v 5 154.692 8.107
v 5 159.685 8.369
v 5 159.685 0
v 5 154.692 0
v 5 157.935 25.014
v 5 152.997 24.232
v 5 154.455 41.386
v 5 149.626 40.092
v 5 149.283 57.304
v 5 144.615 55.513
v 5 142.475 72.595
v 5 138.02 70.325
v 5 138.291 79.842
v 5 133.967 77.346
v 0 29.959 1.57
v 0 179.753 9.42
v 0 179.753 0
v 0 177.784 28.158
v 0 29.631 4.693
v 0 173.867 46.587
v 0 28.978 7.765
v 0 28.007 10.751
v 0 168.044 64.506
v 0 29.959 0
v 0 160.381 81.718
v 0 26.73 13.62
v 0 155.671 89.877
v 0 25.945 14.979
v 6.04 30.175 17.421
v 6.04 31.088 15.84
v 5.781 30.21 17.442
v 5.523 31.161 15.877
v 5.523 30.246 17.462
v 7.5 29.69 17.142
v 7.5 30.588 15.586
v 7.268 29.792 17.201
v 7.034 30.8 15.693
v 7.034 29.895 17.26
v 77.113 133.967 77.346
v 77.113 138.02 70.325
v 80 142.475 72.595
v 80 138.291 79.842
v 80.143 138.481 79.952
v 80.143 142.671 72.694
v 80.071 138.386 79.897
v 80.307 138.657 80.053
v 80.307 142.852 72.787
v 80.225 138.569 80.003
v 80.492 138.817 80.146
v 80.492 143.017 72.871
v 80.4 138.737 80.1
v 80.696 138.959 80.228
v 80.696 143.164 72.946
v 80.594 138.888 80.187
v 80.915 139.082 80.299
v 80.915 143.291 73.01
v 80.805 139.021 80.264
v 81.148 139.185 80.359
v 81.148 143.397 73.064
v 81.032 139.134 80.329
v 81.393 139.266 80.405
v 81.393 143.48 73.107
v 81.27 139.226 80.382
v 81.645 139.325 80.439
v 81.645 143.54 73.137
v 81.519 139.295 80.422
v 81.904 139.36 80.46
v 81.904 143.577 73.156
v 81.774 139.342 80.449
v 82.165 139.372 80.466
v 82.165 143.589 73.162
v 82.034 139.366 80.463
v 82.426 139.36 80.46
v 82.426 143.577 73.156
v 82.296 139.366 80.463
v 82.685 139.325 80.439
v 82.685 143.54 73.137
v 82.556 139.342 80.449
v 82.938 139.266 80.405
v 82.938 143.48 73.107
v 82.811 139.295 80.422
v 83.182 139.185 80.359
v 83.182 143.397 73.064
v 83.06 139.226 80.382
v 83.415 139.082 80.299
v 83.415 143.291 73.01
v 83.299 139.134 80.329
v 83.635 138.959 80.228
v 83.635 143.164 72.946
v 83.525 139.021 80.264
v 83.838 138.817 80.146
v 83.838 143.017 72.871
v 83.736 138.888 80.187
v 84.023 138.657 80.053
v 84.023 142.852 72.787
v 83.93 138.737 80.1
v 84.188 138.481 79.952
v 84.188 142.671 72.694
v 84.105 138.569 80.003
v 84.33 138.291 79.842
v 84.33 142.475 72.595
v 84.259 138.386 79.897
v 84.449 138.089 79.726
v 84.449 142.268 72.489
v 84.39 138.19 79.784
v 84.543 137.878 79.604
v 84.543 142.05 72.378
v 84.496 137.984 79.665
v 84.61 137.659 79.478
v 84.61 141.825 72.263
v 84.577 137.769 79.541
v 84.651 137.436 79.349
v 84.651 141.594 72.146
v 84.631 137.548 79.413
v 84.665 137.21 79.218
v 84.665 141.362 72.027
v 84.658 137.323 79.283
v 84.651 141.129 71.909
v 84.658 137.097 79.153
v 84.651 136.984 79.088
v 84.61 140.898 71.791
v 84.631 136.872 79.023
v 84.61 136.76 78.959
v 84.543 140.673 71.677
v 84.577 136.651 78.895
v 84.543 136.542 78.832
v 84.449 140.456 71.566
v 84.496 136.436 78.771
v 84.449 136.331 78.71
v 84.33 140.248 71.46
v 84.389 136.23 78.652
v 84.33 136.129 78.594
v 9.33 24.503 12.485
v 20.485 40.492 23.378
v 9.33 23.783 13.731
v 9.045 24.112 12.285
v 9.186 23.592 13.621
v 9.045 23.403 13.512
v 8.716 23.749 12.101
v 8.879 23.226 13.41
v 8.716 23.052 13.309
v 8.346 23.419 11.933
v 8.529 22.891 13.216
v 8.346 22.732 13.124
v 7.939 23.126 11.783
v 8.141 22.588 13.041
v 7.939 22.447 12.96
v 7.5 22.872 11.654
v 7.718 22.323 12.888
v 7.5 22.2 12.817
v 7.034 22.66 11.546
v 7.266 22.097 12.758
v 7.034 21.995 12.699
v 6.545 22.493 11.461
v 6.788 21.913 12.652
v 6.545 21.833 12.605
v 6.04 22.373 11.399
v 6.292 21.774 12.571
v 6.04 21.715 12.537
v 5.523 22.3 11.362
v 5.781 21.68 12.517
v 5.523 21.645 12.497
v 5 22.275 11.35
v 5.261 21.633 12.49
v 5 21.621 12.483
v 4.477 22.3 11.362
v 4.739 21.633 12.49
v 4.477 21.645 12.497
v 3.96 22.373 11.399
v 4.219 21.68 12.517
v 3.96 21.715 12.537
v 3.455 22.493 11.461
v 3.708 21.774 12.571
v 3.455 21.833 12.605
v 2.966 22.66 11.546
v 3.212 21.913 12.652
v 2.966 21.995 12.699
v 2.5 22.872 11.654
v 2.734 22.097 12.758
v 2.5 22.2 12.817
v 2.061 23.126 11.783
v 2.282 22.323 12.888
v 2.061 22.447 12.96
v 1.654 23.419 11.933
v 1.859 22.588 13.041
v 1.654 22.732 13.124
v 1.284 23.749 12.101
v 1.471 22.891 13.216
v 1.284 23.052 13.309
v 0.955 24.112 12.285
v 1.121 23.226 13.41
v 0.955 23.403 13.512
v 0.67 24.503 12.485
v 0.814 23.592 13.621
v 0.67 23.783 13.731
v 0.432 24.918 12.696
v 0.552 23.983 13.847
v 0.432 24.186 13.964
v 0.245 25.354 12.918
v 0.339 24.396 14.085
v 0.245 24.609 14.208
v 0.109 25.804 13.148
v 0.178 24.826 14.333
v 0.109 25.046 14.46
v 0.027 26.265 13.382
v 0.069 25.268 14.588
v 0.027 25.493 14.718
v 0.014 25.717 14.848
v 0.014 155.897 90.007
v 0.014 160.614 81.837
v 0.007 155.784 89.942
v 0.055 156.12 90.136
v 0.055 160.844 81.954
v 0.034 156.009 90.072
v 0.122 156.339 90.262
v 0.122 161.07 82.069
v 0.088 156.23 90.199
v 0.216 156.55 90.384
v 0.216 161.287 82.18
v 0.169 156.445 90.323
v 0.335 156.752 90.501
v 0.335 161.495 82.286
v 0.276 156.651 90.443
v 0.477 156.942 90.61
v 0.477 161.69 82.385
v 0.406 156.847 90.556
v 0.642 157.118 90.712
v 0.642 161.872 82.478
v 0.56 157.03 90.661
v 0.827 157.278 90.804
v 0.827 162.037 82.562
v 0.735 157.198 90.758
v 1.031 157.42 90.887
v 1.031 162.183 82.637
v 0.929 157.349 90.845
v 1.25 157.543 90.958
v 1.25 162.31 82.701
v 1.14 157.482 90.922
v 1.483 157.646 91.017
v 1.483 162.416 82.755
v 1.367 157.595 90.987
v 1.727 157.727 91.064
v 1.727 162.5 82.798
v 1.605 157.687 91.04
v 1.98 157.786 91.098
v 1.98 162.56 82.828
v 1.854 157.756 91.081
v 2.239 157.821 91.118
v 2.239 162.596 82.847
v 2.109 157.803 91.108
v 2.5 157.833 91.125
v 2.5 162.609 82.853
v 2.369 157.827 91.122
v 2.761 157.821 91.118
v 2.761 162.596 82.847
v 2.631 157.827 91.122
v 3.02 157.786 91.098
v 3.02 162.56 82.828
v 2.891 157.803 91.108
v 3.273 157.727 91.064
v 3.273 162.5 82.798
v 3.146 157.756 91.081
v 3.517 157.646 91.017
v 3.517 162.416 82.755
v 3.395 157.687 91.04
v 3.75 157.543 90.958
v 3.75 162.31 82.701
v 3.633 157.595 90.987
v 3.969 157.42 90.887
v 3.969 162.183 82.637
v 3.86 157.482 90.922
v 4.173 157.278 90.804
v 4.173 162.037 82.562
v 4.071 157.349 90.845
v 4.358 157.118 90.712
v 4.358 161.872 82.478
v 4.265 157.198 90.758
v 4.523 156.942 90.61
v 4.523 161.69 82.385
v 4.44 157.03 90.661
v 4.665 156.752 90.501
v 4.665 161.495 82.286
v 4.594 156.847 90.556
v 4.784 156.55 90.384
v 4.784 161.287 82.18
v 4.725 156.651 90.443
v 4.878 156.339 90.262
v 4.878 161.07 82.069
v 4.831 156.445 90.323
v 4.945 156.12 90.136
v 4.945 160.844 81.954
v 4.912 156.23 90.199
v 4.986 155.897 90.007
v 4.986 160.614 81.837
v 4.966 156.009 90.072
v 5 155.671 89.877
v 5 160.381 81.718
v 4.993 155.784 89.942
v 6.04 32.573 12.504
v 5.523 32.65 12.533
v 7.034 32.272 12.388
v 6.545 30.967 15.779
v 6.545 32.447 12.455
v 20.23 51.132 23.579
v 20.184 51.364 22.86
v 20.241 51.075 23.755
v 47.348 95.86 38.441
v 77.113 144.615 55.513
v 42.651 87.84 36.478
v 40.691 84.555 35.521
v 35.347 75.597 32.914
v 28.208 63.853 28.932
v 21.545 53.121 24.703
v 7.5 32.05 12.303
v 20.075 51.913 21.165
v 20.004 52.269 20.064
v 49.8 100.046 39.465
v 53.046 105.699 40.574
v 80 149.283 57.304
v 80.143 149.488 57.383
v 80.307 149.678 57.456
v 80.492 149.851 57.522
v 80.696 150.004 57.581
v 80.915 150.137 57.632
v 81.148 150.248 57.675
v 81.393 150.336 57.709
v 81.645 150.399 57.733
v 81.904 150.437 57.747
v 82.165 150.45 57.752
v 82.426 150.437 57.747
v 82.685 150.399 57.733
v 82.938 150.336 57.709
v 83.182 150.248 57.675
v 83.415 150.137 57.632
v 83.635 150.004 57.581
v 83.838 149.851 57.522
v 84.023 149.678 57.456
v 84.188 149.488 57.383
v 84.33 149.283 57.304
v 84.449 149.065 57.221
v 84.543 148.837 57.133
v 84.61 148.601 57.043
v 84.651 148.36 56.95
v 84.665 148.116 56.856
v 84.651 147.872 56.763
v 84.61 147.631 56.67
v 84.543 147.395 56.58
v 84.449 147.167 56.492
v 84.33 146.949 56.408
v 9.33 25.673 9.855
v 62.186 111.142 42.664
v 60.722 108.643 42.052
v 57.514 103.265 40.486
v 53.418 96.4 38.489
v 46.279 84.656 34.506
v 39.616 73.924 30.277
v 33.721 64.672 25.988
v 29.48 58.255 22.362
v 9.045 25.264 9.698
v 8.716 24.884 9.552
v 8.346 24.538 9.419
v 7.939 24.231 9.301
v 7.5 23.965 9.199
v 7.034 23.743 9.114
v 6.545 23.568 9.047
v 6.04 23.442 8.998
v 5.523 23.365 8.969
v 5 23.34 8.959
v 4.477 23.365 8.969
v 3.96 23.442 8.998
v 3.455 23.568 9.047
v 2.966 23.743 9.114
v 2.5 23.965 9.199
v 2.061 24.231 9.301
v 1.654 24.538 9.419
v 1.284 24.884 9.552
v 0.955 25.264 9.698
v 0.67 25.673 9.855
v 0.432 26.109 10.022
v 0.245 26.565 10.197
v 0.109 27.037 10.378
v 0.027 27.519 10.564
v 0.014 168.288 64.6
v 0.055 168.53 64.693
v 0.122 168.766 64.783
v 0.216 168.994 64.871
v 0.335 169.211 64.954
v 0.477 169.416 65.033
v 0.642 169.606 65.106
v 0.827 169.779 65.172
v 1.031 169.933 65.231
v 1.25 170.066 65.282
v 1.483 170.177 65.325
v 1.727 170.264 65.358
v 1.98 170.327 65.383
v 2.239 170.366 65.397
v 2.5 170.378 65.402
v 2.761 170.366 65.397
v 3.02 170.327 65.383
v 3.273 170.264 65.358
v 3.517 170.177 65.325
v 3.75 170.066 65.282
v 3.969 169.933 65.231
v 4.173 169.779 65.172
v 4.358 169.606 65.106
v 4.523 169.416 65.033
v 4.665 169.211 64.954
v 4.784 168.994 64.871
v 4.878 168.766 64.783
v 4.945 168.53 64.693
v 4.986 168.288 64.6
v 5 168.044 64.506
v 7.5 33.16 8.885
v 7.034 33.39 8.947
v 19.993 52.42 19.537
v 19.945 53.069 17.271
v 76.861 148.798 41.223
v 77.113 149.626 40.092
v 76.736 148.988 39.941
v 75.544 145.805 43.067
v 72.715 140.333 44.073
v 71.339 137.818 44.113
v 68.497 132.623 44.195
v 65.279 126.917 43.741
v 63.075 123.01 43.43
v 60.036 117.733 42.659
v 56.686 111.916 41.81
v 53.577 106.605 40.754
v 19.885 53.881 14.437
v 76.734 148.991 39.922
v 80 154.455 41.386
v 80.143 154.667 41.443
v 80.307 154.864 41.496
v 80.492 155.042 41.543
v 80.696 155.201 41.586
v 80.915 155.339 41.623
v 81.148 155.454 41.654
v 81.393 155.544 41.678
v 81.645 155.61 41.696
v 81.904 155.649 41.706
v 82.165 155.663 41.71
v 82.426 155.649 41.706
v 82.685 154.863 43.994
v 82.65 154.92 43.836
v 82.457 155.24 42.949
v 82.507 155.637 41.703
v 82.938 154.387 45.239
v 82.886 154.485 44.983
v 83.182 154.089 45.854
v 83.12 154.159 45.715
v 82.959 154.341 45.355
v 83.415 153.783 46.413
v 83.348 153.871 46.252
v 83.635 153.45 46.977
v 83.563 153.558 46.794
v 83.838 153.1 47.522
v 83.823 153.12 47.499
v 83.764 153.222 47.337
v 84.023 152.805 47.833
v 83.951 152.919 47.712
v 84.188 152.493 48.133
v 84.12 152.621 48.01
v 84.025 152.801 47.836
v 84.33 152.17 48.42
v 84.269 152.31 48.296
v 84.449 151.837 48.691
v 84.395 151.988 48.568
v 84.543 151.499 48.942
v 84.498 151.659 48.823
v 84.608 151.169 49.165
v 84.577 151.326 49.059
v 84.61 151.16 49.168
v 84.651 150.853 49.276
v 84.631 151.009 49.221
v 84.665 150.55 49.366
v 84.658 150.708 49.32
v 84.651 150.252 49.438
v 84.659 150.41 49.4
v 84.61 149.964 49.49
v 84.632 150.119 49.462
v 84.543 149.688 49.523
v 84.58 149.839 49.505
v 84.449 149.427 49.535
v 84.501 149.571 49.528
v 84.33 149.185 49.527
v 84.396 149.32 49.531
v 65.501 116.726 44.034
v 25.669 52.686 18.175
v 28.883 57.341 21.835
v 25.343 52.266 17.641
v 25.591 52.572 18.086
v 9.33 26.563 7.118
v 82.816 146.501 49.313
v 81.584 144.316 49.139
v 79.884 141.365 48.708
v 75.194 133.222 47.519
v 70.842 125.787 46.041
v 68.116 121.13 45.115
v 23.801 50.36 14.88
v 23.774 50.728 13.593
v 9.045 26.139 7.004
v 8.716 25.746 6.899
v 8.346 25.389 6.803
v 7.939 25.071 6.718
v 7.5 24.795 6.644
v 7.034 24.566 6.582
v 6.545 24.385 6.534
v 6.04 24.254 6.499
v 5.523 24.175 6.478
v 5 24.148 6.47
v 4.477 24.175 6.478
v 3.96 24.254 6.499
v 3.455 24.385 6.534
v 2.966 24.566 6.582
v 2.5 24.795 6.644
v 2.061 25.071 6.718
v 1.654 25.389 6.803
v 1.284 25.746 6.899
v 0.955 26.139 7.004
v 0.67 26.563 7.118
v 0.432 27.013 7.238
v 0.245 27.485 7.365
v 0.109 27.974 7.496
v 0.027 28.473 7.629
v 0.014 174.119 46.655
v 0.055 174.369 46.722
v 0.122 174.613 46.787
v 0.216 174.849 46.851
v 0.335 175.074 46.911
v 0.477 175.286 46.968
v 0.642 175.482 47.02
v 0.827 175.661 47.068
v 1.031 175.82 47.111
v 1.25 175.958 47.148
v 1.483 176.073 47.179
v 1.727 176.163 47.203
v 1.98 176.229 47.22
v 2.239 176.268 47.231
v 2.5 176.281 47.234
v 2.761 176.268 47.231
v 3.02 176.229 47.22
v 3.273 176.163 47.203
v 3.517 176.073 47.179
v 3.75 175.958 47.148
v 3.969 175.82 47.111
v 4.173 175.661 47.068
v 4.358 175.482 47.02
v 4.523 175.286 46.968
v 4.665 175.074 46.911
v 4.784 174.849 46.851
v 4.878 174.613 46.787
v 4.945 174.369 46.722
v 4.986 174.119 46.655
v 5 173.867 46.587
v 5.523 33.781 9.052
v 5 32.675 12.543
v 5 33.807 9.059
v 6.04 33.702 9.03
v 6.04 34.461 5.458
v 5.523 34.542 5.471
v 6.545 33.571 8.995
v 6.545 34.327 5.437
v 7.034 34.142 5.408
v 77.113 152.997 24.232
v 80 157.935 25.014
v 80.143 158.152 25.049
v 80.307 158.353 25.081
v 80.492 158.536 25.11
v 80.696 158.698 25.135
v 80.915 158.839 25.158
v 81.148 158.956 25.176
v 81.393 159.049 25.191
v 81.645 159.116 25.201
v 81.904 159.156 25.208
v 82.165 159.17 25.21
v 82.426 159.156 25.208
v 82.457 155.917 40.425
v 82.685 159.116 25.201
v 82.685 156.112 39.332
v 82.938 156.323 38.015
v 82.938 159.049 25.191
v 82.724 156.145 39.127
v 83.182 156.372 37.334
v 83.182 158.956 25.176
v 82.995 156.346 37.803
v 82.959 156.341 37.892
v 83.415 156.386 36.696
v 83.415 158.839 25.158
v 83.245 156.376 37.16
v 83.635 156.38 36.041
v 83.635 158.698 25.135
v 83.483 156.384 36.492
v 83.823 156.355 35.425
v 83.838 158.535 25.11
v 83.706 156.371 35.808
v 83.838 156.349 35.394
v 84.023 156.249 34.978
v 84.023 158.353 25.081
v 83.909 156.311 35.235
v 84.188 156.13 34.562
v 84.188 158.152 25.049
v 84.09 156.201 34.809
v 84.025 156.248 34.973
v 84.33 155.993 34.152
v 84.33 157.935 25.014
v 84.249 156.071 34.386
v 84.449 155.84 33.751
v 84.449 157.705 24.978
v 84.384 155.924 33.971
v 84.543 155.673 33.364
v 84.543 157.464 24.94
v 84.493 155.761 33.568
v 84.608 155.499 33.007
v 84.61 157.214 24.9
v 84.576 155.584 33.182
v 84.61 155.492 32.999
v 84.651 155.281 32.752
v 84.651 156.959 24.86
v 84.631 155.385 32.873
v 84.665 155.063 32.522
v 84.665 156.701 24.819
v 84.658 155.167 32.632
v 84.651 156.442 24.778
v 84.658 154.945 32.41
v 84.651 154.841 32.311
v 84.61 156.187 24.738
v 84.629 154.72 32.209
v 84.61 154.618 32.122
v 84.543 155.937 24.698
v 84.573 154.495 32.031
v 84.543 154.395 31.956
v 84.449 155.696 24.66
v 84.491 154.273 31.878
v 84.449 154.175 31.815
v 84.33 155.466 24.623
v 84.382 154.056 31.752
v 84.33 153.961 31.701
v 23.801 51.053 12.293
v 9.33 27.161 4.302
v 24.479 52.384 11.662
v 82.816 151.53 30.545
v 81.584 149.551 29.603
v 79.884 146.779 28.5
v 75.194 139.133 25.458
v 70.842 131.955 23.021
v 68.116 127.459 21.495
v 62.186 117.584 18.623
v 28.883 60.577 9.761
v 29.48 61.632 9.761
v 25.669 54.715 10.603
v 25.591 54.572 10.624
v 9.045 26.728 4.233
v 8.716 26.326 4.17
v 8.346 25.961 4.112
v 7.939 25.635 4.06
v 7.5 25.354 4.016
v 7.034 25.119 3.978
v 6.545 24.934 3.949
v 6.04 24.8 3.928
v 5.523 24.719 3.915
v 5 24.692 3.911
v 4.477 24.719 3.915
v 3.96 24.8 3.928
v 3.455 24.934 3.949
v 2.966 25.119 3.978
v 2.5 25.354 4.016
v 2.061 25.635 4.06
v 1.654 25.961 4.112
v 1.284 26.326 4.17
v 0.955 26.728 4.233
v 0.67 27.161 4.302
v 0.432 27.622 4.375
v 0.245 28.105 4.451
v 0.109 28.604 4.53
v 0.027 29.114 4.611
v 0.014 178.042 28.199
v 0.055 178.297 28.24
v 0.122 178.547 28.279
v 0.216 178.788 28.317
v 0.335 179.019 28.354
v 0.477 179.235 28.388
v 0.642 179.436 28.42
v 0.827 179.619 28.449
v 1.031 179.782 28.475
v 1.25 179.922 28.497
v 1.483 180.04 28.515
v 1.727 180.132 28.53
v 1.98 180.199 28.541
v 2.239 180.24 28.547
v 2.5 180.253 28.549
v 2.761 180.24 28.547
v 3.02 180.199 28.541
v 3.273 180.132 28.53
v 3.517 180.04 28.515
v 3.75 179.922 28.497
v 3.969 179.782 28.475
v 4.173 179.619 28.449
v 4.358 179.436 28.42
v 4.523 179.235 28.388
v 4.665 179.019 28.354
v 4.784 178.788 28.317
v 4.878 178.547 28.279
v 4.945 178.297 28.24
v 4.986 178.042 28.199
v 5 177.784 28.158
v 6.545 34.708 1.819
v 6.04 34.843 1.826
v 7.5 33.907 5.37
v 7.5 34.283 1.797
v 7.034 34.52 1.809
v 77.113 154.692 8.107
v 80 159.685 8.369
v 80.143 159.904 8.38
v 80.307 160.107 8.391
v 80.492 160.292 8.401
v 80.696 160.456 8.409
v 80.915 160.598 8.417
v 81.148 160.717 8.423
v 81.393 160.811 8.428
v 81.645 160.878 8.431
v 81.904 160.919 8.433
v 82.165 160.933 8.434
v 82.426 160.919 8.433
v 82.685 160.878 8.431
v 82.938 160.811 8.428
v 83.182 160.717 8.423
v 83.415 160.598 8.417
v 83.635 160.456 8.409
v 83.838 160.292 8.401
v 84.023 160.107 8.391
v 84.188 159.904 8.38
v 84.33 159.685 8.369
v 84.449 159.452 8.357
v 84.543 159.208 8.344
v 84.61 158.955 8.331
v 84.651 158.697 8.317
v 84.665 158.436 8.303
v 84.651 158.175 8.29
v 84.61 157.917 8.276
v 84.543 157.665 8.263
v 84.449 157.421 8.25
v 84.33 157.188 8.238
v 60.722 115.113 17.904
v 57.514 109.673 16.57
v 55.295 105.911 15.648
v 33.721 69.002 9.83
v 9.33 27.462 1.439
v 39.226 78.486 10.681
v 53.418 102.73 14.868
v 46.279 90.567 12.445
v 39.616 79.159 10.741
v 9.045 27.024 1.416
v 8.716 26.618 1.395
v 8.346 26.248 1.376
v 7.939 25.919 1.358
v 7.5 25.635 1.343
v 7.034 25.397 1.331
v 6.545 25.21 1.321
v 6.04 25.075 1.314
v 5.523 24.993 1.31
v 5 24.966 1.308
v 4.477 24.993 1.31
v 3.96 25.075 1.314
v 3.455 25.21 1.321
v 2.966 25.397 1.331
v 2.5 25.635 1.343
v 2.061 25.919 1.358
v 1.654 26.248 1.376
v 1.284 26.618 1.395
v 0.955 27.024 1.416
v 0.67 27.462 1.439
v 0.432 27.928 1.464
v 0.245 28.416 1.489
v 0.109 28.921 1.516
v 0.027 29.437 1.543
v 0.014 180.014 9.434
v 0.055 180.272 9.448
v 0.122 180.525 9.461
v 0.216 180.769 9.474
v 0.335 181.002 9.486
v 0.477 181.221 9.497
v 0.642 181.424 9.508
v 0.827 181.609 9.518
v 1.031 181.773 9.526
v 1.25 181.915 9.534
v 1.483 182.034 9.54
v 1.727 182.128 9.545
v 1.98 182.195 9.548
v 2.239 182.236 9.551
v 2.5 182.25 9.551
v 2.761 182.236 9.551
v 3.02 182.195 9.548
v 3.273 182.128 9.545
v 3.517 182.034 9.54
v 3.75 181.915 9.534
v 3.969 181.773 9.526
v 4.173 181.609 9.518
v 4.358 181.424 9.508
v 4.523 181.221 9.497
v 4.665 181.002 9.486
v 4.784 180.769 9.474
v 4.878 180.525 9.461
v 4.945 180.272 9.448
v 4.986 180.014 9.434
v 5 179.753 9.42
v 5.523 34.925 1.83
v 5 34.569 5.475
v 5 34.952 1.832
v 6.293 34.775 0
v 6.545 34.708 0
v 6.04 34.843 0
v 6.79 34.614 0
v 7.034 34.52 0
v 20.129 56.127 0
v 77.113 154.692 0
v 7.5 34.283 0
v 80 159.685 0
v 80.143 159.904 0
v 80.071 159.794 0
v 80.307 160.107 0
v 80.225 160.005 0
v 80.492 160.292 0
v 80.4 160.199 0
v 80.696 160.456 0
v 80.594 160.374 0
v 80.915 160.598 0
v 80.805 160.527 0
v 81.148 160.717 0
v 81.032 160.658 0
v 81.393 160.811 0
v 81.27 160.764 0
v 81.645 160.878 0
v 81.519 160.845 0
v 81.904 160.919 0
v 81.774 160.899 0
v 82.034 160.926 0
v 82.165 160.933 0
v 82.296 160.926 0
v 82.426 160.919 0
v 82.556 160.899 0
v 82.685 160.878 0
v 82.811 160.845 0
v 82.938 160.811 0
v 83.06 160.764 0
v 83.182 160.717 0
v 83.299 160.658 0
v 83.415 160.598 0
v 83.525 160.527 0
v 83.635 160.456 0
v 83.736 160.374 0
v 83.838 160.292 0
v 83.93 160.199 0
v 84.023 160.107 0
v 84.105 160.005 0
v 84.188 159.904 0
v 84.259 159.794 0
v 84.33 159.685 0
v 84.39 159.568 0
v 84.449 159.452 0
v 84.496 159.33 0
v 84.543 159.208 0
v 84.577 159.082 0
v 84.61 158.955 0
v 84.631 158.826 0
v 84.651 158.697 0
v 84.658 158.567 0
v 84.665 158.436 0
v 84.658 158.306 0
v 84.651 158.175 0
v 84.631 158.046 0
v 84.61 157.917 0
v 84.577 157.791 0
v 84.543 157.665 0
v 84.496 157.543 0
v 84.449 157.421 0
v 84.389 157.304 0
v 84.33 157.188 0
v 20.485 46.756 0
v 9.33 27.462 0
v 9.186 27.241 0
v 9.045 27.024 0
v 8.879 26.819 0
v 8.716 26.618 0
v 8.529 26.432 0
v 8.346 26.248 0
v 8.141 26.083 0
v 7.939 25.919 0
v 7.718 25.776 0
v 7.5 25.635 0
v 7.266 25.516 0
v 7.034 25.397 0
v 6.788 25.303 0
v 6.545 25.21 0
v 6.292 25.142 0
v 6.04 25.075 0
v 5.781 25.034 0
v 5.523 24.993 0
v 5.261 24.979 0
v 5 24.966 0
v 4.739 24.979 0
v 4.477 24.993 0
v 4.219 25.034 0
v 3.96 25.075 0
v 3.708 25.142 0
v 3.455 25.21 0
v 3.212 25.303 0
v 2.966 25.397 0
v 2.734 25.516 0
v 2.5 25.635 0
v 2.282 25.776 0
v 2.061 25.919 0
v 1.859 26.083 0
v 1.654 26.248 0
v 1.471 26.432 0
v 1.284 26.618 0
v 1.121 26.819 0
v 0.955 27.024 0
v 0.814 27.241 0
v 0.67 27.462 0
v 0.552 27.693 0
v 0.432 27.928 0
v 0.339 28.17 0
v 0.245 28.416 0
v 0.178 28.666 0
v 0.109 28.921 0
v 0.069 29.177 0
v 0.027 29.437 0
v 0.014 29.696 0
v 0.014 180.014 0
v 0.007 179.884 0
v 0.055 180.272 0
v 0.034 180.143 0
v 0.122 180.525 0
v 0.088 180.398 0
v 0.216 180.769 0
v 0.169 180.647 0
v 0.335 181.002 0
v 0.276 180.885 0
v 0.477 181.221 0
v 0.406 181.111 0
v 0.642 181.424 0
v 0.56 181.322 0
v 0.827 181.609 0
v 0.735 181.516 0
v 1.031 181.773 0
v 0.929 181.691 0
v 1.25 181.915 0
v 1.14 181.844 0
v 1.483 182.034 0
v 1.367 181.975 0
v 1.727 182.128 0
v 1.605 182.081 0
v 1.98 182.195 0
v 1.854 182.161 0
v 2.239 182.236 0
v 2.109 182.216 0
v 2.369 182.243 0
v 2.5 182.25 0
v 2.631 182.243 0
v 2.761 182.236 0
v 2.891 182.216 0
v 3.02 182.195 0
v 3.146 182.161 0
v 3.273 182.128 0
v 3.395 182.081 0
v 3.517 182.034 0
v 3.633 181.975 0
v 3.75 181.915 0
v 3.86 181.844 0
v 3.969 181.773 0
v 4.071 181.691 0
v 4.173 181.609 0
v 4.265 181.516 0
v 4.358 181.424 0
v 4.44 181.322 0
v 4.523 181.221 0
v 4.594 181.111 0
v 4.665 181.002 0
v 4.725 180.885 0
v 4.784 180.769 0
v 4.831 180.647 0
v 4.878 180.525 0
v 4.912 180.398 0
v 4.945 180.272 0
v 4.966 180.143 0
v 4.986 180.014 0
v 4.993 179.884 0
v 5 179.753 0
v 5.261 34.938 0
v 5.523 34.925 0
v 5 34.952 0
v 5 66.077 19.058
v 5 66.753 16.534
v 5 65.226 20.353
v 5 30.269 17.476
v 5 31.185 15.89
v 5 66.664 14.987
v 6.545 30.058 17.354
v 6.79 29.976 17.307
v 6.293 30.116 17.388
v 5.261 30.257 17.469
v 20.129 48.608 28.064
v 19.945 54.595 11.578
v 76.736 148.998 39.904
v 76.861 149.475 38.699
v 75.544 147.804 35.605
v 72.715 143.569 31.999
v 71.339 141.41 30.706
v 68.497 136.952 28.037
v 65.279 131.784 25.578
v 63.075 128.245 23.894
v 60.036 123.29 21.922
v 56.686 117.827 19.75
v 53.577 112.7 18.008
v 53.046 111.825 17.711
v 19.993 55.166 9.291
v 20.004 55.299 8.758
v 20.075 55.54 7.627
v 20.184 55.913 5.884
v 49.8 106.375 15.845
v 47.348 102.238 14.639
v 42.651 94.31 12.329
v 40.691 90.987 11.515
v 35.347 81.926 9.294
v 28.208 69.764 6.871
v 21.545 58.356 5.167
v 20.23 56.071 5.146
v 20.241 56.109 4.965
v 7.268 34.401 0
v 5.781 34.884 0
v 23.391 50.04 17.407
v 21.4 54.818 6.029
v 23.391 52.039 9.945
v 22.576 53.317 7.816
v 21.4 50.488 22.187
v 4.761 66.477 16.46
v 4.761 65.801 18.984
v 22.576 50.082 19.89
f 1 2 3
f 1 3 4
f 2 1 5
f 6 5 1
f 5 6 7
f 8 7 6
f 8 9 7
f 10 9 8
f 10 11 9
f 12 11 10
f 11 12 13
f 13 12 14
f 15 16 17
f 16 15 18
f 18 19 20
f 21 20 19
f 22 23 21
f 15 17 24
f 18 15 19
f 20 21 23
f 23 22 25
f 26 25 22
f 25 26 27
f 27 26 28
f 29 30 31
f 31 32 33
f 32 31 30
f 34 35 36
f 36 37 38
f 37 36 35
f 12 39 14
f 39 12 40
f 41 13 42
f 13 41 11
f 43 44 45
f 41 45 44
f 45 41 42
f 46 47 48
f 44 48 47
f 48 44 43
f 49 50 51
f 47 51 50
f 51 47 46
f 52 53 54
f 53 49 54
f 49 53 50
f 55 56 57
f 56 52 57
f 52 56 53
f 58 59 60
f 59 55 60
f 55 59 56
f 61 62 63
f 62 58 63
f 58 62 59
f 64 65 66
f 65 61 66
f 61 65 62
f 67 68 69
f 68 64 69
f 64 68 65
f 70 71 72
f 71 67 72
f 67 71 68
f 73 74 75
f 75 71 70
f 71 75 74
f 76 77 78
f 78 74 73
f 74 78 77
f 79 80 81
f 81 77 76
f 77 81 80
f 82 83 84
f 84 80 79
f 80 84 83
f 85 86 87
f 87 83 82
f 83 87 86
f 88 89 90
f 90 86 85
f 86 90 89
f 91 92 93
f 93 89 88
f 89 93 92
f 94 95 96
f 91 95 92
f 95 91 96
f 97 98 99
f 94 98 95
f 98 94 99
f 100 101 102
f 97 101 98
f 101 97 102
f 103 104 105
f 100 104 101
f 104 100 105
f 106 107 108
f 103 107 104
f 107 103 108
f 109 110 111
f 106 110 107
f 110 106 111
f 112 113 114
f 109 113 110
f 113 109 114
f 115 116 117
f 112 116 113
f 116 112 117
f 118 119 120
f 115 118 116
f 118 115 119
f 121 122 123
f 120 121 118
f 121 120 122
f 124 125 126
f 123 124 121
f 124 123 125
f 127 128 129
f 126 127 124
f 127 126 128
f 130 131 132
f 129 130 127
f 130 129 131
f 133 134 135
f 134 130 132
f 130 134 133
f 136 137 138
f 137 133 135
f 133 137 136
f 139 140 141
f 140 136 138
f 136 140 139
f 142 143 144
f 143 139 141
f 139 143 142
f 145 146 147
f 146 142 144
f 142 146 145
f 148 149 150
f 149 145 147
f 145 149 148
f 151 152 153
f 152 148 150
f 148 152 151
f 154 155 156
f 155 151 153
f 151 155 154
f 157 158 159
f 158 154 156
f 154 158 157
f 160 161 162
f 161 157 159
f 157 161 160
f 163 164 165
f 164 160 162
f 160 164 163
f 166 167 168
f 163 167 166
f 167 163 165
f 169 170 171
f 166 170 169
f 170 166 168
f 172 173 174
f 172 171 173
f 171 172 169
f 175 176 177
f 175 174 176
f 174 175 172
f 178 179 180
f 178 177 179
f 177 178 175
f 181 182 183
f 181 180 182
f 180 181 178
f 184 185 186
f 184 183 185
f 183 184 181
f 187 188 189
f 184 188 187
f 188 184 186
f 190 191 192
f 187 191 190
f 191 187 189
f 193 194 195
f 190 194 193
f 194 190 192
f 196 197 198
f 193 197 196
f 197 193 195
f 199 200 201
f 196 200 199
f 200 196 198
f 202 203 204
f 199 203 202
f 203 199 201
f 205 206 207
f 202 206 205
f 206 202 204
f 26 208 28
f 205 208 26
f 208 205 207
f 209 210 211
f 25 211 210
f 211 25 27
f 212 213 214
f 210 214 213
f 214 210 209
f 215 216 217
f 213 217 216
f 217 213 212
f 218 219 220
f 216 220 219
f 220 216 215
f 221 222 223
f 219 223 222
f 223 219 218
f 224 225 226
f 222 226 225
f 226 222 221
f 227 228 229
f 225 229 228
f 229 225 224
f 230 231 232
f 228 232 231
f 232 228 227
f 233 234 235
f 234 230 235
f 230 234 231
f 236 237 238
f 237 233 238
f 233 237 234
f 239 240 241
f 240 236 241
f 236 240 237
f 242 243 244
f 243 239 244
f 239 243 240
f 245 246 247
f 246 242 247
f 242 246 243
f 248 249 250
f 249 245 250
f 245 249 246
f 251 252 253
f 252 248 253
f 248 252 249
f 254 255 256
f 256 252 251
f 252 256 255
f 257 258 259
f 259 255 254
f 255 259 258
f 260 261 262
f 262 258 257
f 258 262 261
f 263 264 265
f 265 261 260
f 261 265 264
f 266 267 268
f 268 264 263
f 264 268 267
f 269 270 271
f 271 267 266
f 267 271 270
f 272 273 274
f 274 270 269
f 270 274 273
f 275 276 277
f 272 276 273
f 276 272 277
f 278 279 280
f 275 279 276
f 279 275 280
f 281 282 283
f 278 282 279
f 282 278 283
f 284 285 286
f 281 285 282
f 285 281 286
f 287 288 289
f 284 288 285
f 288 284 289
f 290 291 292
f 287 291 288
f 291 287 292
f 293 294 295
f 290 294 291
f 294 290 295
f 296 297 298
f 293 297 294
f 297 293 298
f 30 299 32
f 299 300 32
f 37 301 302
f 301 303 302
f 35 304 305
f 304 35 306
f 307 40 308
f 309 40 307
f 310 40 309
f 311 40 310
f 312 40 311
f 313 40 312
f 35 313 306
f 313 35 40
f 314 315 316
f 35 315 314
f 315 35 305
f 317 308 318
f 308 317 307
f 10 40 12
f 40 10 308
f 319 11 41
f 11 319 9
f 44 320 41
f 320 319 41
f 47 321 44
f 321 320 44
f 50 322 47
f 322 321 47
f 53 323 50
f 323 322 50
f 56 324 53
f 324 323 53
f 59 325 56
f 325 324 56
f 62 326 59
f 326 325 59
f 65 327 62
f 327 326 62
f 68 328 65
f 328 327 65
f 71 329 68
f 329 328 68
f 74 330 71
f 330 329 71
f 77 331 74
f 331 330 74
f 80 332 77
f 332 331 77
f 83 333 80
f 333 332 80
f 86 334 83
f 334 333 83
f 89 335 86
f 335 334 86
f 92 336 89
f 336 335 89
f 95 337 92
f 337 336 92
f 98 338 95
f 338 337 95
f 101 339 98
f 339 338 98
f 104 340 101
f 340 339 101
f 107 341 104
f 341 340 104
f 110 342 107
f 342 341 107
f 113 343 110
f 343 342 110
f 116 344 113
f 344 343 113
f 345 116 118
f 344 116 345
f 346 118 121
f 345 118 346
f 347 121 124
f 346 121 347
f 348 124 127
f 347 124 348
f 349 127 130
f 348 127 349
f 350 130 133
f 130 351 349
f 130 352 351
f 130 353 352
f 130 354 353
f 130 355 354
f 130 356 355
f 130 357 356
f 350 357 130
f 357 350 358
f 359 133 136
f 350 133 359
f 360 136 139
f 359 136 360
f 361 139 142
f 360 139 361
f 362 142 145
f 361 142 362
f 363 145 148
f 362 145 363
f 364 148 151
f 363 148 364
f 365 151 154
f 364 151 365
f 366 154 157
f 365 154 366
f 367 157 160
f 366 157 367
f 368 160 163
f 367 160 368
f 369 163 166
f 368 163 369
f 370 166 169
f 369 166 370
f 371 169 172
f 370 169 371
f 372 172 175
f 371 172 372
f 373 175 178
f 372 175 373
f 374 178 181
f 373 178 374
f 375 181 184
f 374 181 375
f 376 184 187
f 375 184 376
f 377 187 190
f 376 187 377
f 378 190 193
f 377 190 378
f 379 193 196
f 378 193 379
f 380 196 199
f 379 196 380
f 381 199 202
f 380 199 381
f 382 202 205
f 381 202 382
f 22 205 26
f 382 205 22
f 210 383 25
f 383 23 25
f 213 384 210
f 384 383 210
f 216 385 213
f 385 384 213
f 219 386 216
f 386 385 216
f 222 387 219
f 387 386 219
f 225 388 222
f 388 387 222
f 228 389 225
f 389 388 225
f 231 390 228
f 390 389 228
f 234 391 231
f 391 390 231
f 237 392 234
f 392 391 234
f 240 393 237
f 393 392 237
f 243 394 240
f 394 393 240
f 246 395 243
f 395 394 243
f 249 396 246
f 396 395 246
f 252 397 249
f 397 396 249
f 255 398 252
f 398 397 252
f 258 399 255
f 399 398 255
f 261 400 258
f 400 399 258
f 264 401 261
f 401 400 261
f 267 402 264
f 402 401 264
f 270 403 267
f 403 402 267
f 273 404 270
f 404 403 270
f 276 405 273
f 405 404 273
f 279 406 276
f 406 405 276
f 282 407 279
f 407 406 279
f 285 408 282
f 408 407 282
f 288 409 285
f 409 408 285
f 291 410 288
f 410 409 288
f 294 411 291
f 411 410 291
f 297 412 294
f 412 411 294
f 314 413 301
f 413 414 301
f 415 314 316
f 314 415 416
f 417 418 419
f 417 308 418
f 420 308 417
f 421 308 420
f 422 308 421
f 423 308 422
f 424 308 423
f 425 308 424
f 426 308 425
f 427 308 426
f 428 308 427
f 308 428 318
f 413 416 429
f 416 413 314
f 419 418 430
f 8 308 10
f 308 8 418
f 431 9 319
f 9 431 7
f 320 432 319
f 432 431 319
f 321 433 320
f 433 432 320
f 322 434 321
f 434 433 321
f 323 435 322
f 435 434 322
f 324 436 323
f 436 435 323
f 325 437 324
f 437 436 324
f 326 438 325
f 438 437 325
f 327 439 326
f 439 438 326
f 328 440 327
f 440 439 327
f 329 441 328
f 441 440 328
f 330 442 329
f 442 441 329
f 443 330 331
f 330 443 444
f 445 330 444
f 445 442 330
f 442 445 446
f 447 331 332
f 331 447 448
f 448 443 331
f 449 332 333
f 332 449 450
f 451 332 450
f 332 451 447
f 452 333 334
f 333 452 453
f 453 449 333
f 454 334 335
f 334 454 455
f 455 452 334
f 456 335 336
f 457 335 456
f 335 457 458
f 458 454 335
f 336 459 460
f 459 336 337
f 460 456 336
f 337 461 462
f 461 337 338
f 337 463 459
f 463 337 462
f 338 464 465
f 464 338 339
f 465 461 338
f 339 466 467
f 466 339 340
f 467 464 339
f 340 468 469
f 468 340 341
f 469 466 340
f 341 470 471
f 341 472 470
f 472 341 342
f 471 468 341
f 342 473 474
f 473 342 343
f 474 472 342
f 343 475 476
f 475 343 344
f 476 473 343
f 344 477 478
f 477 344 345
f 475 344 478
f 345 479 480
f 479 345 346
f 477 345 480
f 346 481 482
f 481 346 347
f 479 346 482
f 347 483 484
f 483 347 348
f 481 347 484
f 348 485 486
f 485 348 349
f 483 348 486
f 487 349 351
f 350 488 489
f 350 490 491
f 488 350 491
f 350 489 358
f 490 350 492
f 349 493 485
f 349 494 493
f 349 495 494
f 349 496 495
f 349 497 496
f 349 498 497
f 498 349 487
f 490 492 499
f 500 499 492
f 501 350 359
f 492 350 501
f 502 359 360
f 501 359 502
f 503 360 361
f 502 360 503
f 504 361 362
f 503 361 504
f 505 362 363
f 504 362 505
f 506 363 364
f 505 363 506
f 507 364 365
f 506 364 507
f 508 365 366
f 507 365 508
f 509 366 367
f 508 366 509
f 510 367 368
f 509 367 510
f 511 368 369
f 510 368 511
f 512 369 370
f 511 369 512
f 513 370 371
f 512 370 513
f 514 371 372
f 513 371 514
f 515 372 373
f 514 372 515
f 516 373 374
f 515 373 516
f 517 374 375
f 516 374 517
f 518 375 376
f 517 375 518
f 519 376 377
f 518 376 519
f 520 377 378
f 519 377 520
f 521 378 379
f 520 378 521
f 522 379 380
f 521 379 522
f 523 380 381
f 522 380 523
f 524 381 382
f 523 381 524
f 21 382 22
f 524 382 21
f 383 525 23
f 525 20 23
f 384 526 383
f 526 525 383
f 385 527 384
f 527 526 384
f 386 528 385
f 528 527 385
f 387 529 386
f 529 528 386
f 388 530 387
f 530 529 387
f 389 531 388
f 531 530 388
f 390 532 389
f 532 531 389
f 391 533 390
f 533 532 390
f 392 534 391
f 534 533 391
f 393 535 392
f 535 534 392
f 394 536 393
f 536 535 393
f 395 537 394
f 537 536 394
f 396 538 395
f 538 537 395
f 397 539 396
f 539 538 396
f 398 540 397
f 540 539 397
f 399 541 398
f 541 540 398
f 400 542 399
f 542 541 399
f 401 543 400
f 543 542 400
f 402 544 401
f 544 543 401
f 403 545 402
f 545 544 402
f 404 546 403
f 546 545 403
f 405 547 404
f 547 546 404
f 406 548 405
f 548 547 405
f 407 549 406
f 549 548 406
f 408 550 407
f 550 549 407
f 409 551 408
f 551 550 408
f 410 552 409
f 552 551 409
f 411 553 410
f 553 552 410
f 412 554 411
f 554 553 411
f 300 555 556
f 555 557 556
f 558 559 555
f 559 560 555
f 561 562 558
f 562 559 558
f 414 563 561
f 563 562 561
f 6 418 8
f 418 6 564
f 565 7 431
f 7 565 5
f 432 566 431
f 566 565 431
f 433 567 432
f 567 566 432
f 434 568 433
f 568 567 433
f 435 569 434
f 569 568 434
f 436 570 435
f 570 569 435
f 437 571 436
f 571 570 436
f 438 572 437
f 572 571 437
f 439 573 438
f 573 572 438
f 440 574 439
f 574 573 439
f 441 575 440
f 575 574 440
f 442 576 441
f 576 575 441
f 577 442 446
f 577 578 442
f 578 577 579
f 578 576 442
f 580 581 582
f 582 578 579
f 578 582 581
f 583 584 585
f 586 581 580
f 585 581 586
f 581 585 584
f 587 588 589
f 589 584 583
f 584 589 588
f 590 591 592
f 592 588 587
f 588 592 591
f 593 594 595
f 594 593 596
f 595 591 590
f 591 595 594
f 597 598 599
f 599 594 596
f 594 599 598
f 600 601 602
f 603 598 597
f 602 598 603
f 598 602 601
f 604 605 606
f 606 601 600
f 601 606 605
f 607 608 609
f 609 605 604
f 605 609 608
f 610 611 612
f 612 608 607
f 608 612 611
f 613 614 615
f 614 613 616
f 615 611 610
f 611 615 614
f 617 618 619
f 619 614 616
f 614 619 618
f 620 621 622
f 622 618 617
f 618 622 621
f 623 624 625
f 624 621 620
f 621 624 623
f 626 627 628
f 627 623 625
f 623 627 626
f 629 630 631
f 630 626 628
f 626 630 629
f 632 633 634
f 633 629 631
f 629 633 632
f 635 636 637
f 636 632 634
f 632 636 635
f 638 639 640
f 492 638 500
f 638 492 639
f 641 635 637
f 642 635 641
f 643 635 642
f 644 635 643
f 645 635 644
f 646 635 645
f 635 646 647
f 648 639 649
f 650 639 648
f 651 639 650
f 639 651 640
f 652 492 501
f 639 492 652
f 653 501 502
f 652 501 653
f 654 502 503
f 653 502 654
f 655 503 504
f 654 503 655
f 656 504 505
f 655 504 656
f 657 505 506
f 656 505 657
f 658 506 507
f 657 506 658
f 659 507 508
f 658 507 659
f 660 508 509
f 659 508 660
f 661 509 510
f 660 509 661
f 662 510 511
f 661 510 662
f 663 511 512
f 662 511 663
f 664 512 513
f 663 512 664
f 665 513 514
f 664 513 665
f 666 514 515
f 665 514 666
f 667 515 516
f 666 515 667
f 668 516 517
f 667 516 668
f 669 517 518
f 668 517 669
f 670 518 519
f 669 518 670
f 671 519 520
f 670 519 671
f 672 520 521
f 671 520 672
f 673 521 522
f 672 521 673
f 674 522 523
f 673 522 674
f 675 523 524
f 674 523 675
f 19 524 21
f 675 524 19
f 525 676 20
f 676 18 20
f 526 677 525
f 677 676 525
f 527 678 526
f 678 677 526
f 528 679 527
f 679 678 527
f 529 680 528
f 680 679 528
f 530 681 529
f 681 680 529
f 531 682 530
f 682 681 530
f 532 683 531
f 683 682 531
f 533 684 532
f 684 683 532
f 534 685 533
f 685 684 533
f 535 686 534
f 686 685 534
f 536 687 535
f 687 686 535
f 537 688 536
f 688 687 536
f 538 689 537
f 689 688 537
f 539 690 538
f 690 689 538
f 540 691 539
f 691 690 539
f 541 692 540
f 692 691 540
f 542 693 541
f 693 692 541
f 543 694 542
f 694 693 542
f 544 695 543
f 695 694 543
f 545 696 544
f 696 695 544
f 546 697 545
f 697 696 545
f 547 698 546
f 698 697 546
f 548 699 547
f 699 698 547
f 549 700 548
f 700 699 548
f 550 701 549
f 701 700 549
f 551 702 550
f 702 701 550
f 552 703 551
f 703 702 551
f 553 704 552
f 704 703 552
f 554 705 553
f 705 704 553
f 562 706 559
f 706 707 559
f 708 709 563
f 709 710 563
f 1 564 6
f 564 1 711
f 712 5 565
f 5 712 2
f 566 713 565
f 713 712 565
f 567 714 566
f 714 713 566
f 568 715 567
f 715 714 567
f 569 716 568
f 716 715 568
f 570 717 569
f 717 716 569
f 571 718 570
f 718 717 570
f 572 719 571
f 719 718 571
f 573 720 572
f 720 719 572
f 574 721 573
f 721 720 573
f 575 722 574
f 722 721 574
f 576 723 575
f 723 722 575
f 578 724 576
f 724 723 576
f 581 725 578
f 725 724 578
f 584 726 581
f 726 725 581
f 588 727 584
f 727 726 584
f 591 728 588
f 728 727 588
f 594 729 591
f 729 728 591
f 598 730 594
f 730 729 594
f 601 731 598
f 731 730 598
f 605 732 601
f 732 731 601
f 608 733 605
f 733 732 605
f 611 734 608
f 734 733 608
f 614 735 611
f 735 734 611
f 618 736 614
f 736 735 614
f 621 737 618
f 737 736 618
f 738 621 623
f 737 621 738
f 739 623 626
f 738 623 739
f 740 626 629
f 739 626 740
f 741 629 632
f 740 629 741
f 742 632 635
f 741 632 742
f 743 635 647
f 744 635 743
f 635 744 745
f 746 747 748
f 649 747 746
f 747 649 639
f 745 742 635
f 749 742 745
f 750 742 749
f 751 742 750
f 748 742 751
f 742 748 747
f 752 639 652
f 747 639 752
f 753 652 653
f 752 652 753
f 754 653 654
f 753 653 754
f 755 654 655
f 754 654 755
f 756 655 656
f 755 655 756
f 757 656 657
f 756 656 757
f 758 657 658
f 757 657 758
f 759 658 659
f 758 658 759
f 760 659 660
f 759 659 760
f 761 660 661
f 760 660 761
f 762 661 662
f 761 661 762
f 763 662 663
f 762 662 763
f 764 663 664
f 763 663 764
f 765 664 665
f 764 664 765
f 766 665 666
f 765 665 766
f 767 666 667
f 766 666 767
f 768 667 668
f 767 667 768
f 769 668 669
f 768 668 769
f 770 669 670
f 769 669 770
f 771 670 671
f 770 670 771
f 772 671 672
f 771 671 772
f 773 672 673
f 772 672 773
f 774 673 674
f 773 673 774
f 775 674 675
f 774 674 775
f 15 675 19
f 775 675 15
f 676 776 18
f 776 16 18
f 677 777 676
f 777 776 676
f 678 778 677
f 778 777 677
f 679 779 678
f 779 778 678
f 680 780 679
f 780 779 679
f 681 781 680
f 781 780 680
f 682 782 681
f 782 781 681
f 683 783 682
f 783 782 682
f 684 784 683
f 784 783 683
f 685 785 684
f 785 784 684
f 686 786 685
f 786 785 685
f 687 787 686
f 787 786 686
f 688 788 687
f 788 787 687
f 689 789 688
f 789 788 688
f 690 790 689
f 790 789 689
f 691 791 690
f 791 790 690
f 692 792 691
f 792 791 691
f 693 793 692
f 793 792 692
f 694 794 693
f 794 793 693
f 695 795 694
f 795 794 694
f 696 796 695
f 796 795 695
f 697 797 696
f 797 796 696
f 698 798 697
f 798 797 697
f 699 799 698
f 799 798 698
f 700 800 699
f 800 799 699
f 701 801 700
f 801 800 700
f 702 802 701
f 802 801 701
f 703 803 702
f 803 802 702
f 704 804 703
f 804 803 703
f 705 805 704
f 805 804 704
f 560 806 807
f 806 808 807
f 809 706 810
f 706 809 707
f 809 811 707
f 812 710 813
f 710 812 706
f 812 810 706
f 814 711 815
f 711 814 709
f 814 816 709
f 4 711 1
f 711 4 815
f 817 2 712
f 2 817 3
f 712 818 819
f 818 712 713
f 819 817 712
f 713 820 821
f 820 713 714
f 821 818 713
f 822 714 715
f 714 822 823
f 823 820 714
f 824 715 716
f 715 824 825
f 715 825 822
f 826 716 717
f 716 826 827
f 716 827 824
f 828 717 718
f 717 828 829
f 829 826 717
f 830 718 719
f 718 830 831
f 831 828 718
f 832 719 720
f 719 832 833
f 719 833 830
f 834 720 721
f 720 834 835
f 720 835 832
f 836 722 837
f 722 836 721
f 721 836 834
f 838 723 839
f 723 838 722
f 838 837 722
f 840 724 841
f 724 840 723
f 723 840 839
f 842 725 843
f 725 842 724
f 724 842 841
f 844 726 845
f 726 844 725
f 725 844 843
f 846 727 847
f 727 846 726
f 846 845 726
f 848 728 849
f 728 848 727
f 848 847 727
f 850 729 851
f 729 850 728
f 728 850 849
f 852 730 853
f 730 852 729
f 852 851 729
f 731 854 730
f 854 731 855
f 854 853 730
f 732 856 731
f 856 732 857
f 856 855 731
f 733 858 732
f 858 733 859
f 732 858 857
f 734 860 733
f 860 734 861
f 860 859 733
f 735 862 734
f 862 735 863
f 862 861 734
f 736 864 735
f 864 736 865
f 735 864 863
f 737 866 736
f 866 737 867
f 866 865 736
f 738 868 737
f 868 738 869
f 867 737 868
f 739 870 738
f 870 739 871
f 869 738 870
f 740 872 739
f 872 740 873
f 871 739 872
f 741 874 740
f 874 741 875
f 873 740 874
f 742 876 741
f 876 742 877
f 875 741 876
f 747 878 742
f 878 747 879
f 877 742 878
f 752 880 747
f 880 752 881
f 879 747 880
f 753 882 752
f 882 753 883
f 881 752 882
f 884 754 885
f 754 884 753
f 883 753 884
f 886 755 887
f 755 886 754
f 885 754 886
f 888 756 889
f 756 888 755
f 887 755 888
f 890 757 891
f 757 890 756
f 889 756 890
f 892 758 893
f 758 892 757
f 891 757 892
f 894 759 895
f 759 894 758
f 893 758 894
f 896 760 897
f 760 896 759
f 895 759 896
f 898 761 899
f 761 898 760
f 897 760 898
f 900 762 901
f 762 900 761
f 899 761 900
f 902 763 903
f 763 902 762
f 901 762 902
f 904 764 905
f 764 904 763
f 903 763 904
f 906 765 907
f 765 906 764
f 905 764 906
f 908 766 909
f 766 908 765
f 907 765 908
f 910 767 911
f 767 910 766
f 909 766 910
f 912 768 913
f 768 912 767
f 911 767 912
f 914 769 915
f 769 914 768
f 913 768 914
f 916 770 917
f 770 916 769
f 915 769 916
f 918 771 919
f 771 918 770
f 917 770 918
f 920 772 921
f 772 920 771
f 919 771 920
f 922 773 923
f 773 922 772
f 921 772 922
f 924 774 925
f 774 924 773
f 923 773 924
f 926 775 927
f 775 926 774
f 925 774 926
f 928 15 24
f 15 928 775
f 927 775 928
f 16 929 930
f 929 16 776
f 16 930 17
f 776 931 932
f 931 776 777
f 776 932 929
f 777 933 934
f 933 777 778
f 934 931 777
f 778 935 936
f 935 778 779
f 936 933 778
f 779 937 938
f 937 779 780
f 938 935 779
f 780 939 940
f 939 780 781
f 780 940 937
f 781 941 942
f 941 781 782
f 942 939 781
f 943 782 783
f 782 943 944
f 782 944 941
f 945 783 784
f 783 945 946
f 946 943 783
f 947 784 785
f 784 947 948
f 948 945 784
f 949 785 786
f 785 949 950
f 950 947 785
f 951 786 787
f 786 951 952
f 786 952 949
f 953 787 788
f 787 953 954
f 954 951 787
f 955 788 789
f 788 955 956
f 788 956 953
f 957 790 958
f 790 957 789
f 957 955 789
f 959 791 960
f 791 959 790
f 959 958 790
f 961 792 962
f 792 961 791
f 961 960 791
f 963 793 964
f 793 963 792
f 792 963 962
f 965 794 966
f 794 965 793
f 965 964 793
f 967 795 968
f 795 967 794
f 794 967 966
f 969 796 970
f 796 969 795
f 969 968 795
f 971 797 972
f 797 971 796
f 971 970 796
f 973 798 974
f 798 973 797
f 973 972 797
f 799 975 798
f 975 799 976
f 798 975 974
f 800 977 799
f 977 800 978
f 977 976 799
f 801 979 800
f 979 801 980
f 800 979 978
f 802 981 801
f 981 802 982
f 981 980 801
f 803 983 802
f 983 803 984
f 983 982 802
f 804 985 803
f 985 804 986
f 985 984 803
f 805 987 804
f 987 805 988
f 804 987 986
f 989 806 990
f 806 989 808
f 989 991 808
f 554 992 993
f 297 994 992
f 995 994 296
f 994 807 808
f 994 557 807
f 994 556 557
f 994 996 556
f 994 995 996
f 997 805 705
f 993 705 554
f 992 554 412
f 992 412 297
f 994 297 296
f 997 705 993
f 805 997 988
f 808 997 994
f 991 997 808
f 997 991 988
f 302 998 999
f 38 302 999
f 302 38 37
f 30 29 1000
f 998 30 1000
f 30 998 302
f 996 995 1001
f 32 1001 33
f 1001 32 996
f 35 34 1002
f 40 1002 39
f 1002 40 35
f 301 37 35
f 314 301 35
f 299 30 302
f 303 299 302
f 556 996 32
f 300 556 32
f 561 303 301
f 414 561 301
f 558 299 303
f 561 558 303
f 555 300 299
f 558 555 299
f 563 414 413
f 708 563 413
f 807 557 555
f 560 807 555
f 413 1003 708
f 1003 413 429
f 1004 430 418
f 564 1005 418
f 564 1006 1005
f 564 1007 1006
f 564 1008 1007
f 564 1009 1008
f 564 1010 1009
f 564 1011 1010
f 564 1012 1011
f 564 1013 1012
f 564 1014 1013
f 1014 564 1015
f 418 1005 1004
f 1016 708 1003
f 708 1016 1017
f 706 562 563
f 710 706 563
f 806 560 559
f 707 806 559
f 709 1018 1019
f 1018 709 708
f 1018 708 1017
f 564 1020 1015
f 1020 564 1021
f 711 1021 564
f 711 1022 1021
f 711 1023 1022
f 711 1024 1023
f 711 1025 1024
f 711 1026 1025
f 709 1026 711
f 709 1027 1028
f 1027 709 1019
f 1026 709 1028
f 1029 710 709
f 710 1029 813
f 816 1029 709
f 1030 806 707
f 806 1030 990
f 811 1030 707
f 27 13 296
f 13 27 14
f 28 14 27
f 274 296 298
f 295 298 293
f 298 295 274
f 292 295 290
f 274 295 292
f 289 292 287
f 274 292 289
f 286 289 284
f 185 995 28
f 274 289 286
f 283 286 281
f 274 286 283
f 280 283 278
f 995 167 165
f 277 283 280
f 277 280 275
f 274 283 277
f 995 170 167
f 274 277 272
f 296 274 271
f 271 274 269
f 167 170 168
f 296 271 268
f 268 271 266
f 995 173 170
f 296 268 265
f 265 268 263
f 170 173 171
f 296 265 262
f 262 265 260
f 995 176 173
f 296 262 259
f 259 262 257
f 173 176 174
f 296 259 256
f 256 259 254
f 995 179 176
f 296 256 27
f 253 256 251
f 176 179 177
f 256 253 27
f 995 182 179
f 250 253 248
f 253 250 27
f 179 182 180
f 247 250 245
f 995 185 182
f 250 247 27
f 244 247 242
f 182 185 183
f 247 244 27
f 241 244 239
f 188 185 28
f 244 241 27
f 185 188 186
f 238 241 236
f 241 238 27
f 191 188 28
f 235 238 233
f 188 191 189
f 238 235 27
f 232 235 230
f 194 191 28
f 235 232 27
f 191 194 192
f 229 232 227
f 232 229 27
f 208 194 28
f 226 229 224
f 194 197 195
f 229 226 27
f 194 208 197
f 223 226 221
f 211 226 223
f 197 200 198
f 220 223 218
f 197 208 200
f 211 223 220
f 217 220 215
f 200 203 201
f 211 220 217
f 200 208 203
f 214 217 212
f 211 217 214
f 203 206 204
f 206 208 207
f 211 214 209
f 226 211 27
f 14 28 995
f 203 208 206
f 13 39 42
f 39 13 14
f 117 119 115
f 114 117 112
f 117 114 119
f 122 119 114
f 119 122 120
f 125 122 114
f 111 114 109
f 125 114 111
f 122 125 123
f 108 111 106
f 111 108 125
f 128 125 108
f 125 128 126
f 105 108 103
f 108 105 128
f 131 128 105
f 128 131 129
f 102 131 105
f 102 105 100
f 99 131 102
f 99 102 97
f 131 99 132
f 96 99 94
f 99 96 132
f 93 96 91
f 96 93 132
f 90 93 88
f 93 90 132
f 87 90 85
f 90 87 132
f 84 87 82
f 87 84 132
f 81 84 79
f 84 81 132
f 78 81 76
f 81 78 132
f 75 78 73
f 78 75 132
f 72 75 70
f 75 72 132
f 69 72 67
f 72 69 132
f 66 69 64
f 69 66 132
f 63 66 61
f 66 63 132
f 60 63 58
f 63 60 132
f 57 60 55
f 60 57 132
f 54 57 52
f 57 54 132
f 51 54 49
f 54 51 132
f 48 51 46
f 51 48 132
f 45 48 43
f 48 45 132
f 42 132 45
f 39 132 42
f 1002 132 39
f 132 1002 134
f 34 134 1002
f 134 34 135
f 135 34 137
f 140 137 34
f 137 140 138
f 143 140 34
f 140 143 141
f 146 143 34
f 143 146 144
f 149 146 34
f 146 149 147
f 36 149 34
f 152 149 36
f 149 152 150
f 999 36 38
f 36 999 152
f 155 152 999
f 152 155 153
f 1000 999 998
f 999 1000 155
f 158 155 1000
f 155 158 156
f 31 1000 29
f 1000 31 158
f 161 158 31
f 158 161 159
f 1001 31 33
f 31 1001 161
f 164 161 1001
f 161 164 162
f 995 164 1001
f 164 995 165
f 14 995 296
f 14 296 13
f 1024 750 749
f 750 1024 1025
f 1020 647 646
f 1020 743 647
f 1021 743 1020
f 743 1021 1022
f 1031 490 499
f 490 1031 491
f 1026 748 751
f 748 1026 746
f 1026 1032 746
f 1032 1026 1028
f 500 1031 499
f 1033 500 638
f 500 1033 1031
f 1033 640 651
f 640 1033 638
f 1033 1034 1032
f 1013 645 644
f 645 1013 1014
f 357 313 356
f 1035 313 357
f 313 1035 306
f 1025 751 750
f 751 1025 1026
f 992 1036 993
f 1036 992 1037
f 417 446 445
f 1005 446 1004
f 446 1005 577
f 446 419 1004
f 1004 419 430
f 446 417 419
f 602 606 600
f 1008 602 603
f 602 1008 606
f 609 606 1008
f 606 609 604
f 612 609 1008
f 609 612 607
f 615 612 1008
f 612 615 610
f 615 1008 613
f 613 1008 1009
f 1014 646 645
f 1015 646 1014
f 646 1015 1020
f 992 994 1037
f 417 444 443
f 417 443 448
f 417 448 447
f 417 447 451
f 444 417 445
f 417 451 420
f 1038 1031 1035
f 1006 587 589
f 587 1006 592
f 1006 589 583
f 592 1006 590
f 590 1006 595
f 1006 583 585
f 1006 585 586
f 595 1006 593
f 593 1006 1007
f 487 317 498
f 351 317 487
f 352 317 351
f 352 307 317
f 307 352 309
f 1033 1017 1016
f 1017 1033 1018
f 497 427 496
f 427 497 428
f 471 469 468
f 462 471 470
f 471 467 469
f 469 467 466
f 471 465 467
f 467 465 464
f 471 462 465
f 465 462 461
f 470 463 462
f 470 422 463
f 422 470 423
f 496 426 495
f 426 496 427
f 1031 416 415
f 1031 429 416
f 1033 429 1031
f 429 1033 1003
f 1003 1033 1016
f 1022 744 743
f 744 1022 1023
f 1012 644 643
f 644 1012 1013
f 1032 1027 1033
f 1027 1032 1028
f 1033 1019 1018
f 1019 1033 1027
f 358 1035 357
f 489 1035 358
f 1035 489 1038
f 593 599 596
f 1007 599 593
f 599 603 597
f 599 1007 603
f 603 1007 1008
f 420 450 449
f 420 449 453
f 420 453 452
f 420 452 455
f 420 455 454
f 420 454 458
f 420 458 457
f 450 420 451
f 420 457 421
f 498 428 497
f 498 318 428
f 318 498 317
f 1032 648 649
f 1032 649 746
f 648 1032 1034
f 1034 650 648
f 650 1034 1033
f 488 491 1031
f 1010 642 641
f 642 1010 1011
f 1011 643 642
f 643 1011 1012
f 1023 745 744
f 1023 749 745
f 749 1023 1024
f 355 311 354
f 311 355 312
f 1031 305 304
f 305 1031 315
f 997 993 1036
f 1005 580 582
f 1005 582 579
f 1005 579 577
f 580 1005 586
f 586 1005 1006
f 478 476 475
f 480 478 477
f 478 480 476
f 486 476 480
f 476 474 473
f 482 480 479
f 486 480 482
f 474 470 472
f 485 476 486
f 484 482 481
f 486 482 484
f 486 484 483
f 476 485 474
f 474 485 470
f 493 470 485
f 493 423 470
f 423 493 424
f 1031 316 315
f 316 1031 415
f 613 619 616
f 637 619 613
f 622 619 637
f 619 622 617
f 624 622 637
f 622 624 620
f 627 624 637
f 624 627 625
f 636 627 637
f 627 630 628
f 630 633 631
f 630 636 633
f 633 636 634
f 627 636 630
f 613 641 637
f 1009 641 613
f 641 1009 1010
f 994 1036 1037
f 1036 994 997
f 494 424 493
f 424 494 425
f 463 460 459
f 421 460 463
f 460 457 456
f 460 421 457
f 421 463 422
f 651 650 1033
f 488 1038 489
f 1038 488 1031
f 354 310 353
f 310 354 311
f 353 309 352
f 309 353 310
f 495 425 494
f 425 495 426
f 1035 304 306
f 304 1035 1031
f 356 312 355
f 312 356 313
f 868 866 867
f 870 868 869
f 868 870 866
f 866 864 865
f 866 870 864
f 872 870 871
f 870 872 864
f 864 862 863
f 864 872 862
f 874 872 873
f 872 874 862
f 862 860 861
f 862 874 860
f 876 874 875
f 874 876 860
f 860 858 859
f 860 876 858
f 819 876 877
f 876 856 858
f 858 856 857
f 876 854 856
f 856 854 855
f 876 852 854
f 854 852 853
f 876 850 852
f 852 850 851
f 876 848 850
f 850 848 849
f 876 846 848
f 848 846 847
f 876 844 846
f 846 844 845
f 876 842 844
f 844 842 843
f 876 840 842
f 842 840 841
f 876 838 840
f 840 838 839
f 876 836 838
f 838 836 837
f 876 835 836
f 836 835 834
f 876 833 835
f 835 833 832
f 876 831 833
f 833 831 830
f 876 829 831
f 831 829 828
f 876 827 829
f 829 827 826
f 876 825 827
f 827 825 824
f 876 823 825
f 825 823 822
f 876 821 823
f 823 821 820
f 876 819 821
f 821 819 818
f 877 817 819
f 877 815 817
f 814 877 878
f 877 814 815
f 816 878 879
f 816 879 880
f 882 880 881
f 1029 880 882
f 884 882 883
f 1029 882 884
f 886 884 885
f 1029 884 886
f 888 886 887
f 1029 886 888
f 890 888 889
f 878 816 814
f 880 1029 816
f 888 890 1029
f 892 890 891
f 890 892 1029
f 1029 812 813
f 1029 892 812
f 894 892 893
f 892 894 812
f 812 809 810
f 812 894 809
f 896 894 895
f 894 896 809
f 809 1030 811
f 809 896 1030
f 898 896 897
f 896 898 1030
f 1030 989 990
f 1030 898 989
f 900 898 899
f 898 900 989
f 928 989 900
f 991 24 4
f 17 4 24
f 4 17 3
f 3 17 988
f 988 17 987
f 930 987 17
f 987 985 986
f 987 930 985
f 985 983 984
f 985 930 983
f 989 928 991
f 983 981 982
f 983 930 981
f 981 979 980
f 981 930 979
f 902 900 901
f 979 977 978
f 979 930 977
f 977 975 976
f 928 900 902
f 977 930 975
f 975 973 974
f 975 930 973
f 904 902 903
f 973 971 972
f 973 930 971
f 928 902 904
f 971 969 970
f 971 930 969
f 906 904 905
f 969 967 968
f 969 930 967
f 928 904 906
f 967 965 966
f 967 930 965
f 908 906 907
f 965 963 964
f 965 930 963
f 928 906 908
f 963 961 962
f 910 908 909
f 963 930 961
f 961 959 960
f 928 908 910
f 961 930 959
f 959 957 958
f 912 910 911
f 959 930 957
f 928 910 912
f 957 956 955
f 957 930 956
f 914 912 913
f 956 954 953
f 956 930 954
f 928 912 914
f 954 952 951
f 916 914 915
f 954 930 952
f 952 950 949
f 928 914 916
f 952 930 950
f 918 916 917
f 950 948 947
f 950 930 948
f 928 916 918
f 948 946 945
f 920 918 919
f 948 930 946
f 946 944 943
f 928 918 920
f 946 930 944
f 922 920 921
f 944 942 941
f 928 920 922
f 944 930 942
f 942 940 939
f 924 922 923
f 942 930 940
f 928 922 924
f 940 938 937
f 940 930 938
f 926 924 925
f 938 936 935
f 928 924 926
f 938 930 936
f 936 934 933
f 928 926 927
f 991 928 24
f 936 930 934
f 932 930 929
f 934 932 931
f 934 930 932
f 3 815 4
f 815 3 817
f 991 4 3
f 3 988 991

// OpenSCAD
// E-Cig Holder


depth = 5;
lenght = 150; 
offset = 25;
detail = 60;
e_cig_r = 25/2;

difference(){
rotate([15,0,0]){
	rotate([0,90,0]) holder_wt_hole();
	}
translate([0,0,-1])cube([200,200,1]);
}


module holder_wt_hole(){
	difference(){
		holder();
		translate ([0,lenght/4,-depth])
 			rotate([-50,0,0]) 
				translate([0,0,depth+offset]) 
					cylinder(r=e_cig_r,h=lenght,center=false);
	}
}
module holder(){
	intersection() {
		rotate([90,0,90]) slice();
		difference(){
			rotate_extrude(convexity = 10, $fn=detail)
				mirror([0,0,90])translate([depth+offset,depth,0])frame_outter();
			rotate_extrude(convexity = 10, $fn=detail)
				mirror([0,0,90])translate([depth+offset,depth,0])frame_inner();
		}
	}
}

module slice(){
	hull(){
		rotate([0,15,0])linear_extrude(height = 1) square([lenght*2,lenght*2]);
		rotate([0,-15,0]) linear_extrude(height = 1)  square([lenght*2,lenght*2]);
}
}


module frame_outter(){
	translate([0,-depth,0])square([lenght,depth]);
	translate([lenght,-depth/2,0]) circle(r=depth/2);
	circle(r=depth);
	rotate([0,0,30]) {
		union(){
			square([lenght,depth]);
			translate([lenght,depth/2,0]) circle(r=depth/2);
		}
	}
	translate ([lenght*cos(30)-depth,0]) square([depth,lenght*sin(30)]);
}

module frame_inner() {
	difference(){
		square([lenght,lenght*tan(30)-depth]);
	rotate([0,0,30]) 
			square([lenght/cos(30),lenght*tan(30)-depth]);
		frame_outter();
	}
}
